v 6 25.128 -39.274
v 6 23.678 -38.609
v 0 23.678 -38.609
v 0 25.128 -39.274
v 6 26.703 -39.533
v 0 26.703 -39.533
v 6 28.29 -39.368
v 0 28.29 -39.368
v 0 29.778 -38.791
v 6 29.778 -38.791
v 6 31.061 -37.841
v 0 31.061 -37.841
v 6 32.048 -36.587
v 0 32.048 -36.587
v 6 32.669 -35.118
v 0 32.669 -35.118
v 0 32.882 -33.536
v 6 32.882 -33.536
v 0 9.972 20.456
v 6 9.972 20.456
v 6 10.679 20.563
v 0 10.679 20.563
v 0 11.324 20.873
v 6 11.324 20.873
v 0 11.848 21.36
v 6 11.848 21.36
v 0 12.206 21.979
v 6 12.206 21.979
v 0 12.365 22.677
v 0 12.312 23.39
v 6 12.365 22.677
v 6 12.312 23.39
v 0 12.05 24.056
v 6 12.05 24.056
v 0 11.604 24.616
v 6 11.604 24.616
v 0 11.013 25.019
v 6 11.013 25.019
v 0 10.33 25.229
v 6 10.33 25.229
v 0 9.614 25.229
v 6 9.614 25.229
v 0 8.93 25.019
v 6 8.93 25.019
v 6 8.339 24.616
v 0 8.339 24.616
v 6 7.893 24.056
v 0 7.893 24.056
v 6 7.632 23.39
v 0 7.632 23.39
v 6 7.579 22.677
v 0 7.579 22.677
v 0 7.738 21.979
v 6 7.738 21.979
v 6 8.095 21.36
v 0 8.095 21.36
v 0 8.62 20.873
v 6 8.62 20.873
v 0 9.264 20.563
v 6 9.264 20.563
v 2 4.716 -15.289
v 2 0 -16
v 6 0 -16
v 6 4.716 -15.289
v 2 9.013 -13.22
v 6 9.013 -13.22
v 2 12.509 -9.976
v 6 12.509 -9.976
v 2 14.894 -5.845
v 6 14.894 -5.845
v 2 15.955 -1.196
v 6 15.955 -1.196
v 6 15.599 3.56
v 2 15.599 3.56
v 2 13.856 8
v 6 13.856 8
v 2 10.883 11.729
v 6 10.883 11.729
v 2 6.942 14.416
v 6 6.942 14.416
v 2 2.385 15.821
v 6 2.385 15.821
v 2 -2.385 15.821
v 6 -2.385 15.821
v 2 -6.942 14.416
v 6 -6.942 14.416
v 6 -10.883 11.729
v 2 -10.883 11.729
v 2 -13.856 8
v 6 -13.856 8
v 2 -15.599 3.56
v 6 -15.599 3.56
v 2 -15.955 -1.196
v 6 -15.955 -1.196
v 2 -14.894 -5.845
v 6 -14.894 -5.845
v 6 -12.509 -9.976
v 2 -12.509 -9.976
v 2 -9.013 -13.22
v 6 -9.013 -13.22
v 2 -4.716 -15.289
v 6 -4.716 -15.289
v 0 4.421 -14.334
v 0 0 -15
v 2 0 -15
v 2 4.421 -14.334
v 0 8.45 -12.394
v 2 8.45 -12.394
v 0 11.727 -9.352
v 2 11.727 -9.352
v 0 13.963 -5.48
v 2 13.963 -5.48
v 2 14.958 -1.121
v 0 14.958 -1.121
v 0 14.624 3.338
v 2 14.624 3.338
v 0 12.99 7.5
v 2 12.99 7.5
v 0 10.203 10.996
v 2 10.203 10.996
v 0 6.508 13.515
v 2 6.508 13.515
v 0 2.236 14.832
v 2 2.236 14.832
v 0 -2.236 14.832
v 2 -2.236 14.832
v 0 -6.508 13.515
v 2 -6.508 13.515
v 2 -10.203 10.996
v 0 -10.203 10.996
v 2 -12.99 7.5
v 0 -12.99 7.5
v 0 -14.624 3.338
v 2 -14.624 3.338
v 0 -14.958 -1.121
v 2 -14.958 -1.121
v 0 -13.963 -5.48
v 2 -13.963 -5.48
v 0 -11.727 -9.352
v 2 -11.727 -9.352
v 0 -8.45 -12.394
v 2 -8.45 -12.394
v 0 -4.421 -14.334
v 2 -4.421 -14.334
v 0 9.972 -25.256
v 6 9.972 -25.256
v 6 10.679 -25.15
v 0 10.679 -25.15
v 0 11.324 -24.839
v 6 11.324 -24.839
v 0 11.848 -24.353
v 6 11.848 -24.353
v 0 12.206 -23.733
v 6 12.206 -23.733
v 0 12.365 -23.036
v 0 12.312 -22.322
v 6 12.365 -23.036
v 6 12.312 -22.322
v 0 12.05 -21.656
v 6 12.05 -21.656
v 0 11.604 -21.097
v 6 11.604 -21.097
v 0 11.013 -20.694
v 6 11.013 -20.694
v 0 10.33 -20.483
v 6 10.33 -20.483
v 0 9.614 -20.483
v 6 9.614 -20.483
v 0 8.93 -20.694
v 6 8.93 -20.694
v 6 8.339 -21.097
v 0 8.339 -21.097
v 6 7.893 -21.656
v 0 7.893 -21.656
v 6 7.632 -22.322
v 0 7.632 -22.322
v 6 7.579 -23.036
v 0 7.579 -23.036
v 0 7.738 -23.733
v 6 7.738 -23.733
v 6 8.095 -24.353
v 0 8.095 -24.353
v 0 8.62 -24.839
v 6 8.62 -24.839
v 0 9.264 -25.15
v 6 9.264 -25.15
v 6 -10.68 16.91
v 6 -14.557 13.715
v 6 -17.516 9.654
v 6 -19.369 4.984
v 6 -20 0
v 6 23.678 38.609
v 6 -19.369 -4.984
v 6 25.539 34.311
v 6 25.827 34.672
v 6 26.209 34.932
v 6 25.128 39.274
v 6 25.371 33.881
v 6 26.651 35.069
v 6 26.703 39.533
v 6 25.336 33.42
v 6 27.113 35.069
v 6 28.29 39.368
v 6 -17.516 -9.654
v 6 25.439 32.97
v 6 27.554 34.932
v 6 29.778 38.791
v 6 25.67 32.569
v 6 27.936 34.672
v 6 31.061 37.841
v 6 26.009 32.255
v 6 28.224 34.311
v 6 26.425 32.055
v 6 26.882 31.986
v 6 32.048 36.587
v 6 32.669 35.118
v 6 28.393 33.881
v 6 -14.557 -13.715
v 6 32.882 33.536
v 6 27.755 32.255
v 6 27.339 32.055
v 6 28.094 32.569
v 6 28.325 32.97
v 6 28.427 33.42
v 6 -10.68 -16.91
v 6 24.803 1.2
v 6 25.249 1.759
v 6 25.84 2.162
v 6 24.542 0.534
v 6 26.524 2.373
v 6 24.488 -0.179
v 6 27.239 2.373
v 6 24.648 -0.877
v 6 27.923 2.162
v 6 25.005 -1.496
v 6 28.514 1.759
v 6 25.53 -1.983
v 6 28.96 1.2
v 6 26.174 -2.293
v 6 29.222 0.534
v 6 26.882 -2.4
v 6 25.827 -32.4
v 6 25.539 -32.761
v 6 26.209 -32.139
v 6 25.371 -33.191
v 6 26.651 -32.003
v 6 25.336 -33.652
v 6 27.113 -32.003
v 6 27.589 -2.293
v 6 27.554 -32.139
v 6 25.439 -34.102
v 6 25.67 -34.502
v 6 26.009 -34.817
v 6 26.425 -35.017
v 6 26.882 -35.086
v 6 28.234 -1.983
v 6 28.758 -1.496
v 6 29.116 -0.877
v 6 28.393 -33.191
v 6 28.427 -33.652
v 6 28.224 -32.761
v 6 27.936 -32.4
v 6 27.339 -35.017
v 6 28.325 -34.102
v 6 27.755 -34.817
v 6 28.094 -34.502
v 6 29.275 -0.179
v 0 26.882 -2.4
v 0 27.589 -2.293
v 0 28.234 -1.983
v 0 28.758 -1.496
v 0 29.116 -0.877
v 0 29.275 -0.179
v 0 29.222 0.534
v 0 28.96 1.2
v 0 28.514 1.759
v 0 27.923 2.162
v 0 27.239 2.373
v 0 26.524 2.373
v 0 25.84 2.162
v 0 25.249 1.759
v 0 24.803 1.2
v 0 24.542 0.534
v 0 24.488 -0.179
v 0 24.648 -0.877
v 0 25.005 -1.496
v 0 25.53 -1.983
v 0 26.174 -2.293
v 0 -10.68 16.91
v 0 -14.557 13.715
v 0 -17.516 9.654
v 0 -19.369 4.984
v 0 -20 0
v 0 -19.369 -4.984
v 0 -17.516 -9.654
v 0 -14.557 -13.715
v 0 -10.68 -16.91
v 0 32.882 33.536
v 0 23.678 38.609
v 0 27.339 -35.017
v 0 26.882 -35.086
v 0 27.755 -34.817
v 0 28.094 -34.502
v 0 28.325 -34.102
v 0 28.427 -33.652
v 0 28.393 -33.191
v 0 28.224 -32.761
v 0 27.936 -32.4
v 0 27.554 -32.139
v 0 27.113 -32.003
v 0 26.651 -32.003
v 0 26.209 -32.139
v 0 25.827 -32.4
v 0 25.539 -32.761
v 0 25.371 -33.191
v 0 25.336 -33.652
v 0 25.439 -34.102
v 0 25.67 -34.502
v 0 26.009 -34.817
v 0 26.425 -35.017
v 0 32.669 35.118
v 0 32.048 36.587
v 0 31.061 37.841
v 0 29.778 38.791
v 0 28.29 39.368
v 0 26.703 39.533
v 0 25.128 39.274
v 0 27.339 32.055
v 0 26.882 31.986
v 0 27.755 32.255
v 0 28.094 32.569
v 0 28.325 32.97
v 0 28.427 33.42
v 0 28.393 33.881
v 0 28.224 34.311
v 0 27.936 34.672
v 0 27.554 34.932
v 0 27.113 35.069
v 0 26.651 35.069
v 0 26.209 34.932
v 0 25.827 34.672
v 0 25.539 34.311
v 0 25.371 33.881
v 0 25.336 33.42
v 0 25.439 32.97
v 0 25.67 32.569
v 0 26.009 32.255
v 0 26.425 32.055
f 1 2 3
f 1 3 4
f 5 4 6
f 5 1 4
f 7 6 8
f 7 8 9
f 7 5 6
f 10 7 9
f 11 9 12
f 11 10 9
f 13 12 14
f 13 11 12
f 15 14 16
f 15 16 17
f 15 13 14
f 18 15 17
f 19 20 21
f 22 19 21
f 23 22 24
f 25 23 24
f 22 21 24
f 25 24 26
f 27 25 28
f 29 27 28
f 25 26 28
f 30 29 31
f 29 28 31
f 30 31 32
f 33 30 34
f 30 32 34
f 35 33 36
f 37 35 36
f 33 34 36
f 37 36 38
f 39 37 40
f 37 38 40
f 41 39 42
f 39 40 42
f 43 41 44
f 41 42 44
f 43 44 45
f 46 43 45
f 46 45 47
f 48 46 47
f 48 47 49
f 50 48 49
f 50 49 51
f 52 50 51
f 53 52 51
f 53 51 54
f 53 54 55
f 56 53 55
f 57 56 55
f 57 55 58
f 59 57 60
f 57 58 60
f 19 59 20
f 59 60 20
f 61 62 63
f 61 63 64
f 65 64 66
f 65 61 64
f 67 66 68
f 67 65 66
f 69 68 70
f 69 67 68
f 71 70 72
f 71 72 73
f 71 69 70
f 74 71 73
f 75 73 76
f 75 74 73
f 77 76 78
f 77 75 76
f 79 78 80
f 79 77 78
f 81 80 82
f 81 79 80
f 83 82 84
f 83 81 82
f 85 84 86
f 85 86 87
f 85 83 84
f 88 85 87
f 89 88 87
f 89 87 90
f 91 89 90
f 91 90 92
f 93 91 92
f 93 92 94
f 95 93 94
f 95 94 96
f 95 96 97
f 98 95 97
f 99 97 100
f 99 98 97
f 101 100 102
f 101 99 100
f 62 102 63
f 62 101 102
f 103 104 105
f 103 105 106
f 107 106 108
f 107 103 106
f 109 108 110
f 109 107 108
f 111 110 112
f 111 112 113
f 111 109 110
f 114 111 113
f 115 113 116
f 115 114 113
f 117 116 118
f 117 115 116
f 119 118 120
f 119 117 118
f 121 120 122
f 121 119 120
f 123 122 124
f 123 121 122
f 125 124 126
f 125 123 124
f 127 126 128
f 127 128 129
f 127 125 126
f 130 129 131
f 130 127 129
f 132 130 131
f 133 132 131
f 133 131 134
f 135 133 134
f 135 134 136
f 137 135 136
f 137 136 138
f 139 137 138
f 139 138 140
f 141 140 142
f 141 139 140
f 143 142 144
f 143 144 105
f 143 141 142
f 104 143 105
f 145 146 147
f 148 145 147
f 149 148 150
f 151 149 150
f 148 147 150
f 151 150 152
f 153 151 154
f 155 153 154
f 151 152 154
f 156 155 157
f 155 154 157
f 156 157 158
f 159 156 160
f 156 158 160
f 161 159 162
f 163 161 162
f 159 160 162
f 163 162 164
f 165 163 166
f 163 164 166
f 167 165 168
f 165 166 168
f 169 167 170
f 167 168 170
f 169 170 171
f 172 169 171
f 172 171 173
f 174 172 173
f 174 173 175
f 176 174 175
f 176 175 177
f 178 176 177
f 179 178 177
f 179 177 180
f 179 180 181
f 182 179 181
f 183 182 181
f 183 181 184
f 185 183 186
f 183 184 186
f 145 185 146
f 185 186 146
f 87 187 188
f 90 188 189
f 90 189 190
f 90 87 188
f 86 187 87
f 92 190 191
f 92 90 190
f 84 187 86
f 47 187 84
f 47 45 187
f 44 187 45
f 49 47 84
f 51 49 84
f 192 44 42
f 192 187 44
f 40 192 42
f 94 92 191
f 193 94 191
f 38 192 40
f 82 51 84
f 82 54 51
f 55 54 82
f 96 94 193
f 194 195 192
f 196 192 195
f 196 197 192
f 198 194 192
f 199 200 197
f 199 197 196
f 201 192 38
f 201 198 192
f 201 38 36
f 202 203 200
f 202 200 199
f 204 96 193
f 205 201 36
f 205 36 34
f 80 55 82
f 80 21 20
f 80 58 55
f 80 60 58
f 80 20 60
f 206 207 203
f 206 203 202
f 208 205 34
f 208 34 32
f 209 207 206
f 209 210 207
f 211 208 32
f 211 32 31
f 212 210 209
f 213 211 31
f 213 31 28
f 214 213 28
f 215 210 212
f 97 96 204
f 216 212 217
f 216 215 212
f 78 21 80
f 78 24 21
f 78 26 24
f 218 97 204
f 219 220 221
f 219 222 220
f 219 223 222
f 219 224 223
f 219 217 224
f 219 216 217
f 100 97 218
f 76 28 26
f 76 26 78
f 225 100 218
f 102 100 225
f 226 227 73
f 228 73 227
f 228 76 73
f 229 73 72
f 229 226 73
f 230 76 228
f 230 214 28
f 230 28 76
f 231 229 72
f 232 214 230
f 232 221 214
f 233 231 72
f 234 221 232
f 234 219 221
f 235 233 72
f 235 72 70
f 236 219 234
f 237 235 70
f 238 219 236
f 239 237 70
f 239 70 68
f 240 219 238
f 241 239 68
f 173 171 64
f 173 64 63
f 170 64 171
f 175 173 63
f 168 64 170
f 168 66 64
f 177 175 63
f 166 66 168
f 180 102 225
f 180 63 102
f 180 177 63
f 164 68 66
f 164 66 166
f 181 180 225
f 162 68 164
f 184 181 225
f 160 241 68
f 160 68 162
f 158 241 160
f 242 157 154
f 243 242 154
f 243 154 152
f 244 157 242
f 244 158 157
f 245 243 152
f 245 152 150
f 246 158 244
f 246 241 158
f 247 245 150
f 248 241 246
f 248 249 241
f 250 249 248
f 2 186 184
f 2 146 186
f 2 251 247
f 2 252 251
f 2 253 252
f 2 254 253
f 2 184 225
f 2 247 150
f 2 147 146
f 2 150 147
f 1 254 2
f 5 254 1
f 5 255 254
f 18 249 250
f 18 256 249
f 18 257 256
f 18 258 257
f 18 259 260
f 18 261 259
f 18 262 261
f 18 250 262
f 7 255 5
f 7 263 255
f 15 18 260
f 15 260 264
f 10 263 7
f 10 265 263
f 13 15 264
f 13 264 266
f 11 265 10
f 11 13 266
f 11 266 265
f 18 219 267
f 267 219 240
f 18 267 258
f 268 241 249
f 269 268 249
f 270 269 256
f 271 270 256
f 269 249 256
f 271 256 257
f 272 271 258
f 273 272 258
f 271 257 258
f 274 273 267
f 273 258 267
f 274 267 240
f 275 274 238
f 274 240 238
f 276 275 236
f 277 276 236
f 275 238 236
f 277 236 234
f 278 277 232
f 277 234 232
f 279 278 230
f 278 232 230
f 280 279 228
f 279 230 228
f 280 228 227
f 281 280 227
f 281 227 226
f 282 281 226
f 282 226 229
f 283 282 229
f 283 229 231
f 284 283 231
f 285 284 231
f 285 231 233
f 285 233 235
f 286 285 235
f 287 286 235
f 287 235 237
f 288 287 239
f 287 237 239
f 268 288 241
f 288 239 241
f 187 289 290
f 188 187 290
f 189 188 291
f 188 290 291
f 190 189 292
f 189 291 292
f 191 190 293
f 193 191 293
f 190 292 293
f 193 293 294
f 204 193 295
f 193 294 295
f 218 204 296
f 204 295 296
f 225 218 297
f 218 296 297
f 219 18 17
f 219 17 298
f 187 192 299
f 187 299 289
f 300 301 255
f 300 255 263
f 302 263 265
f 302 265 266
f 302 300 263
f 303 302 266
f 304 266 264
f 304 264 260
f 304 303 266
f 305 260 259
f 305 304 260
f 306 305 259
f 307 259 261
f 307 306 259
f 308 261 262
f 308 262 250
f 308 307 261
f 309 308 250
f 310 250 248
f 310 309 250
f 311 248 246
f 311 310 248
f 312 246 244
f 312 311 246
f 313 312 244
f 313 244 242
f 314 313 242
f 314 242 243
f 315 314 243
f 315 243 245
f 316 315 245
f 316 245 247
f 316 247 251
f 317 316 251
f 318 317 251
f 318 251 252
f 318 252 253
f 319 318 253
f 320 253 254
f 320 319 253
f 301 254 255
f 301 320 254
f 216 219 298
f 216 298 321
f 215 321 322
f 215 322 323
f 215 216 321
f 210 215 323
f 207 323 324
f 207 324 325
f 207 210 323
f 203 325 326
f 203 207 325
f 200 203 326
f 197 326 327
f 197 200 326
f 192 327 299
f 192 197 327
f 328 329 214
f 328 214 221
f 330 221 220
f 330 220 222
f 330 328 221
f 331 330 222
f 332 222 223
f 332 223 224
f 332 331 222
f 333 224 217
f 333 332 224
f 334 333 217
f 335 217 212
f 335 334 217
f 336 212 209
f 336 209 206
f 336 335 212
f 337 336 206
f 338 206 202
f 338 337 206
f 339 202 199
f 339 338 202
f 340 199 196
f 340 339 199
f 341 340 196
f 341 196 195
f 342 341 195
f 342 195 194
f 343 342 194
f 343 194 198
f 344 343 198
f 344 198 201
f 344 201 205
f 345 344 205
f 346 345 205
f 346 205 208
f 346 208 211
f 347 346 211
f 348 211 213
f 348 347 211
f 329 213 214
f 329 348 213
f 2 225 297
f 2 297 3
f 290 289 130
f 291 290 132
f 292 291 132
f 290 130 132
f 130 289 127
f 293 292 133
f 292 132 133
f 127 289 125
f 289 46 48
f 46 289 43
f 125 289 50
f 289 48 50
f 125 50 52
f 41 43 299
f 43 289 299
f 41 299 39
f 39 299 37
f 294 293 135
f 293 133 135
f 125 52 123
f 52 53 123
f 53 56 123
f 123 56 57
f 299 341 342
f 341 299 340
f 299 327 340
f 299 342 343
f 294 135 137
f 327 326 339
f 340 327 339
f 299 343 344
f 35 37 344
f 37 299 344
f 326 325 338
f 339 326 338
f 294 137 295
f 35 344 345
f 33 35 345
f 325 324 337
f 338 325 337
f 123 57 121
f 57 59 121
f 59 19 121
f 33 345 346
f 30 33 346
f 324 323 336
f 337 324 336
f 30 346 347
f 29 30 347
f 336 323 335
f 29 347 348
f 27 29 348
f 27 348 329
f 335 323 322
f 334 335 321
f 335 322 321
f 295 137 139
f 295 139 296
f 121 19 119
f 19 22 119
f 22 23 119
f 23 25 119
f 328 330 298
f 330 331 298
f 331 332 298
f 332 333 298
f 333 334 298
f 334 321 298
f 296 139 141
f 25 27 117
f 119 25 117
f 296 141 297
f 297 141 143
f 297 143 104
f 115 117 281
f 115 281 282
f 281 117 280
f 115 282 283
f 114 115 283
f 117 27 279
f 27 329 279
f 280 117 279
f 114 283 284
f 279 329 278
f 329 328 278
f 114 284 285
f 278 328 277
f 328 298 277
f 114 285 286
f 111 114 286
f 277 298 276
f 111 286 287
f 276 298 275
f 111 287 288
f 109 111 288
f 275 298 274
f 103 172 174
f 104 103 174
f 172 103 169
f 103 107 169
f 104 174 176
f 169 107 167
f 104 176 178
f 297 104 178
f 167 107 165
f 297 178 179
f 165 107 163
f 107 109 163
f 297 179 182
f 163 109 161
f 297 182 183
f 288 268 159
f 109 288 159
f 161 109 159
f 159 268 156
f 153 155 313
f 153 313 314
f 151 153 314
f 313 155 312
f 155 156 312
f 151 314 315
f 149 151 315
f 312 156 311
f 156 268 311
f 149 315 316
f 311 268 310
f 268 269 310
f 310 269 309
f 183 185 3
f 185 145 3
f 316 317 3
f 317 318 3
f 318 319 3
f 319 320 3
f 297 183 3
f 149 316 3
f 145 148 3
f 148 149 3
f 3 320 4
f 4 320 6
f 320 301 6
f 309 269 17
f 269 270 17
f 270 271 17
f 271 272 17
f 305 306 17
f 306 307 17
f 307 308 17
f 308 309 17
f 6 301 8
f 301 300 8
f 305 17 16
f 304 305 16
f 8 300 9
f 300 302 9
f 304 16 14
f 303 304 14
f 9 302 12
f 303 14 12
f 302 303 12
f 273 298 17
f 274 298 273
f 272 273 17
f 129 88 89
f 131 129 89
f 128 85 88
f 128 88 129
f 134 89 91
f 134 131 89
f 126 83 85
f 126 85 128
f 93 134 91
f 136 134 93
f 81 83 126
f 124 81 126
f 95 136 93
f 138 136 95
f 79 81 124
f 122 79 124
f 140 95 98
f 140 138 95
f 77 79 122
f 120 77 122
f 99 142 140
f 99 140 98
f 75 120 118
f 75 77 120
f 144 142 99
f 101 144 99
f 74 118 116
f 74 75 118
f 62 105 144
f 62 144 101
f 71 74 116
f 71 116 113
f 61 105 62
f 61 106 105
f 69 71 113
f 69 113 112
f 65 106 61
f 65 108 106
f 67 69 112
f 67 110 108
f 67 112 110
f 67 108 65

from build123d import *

# Parameters (mm, degrees)
SKETCH1_R           = 20
SKETCH1_R_2         = 15
BOSS_EXTRUDE1_DEPTH = 2
SKETCH2_R           = 20
SKETCH2_R_2         = 16
BOSS_EXTRUDE2_DEPTH = 4
SKETCH3_R           = 2
BOSS_EXTRUDE3_DEPTH = 6
SKETCH4_R           = 2.4
CUT_EXTRUDE1_DEPTH  = 6
SKETCH5_R           = 2
SKETCH5_R_2         = 1.55
BOSS_EXTRUDE4_DEPTH = 6


with BuildPart() as part:
    # Sketch1 → Boss-Extrude1 (new body)
    with BuildSketch(Plane(origin=(0, 0, 0), x_dir=(0, 0, -1), z_dir=(1, 0, 0))):
        Circle(SKETCH1_R)
        Circle(SKETCH1_R_2, mode=Mode.SUBTRACT)
    extrude(amount=BOSS_EXTRUDE1_DEPTH)

    # Sketch2 → Boss-Extrude2 (add)
    with BuildSketch(Plane(origin=(2, 0, 0), x_dir=(0, 0, -1), z_dir=(1, 0, 0))):
        Circle(SKETCH2_R)
        Circle(SKETCH2_R_2, mode=Mode.SUBTRACT)
    extrude(amount=BOSS_EXTRUDE2_DEPTH)

    # Sketch3 → Boss-Extrude3 (add)
    with BuildSketch(Plane(origin=(6, 0, 0), x_dir=(0, 0, -1), z_dir=(1, 0, 0))):
        with BuildLine():
            Line((-38.608830959, 23.677807584), (-16.909895057, -10.679674581))
            ThreePointArc((-16.909895057, -10.679674581), (0, 20), (16.909895057, -10.679674581))
            Line((16.909895057, -10.679674581), (38.608830959, 23.677807584))
            ThreePointArc((38.608830959, 23.677807584), (38.790546744, 29.777964933), (33.535862442, 32.881709959))
            Line((33.535862442, 32.881709959), (-33.535862442, 32.881709959))
            ThreePointArc((-33.535862442, 32.881709959), (-38.790546744, 29.777964933), (-38.608830959, 23.677807584))
        make_face()
        with Locations((-33.535862442, 26.881709959)):
            Circle(SKETCH3_R, mode=Mode.SUBTRACT)
        with Locations((33.535862442, 26.881709959)):
            Circle(SKETCH3_R, mode=Mode.SUBTRACT)
    extrude(amount=-BOSS_EXTRUDE3_DEPTH)

    # Sketch4 → Cut-Extrude1 (cut)
    with BuildSketch(Plane(origin=(6, 0, 0), x_dir=(0, 0, -1), z_dir=(1, 0, 0))):
        with Locations((-22.856187861, 9.971814902)):
            Circle(SKETCH4_R)
        with Locations((22.856187861, 9.971814902)):
            Circle(SKETCH4_R)
        with Locations((0, 26.881709959)):
            Circle(SKETCH4_R)
    extrude(amount=-CUT_EXTRUDE1_DEPTH, mode=Mode.SUBTRACT)

    # Sketch5 → Boss-Extrude4 (add)
    with BuildSketch(Plane(origin=(0, 0, 0), x_dir=(0, 0, -1), z_dir=(1, 0, 0))):
        with Locations((33.535862442, 26.881709959)):
            Circle(SKETCH5_R)
        with Locations((33.535862442, 26.881709959)):
            Circle(SKETCH5_R_2, mode=Mode.SUBTRACT)
        with Locations((-33.535862442, 26.881709959)):
            Circle(SKETCH5_R)
        with Locations((-33.535862442, 26.881709959)):
            Circle(SKETCH5_R_2, mode=Mode.SUBTRACT)
    extrude(amount=BOSS_EXTRUDE4_DEPTH)


solid = part.part
